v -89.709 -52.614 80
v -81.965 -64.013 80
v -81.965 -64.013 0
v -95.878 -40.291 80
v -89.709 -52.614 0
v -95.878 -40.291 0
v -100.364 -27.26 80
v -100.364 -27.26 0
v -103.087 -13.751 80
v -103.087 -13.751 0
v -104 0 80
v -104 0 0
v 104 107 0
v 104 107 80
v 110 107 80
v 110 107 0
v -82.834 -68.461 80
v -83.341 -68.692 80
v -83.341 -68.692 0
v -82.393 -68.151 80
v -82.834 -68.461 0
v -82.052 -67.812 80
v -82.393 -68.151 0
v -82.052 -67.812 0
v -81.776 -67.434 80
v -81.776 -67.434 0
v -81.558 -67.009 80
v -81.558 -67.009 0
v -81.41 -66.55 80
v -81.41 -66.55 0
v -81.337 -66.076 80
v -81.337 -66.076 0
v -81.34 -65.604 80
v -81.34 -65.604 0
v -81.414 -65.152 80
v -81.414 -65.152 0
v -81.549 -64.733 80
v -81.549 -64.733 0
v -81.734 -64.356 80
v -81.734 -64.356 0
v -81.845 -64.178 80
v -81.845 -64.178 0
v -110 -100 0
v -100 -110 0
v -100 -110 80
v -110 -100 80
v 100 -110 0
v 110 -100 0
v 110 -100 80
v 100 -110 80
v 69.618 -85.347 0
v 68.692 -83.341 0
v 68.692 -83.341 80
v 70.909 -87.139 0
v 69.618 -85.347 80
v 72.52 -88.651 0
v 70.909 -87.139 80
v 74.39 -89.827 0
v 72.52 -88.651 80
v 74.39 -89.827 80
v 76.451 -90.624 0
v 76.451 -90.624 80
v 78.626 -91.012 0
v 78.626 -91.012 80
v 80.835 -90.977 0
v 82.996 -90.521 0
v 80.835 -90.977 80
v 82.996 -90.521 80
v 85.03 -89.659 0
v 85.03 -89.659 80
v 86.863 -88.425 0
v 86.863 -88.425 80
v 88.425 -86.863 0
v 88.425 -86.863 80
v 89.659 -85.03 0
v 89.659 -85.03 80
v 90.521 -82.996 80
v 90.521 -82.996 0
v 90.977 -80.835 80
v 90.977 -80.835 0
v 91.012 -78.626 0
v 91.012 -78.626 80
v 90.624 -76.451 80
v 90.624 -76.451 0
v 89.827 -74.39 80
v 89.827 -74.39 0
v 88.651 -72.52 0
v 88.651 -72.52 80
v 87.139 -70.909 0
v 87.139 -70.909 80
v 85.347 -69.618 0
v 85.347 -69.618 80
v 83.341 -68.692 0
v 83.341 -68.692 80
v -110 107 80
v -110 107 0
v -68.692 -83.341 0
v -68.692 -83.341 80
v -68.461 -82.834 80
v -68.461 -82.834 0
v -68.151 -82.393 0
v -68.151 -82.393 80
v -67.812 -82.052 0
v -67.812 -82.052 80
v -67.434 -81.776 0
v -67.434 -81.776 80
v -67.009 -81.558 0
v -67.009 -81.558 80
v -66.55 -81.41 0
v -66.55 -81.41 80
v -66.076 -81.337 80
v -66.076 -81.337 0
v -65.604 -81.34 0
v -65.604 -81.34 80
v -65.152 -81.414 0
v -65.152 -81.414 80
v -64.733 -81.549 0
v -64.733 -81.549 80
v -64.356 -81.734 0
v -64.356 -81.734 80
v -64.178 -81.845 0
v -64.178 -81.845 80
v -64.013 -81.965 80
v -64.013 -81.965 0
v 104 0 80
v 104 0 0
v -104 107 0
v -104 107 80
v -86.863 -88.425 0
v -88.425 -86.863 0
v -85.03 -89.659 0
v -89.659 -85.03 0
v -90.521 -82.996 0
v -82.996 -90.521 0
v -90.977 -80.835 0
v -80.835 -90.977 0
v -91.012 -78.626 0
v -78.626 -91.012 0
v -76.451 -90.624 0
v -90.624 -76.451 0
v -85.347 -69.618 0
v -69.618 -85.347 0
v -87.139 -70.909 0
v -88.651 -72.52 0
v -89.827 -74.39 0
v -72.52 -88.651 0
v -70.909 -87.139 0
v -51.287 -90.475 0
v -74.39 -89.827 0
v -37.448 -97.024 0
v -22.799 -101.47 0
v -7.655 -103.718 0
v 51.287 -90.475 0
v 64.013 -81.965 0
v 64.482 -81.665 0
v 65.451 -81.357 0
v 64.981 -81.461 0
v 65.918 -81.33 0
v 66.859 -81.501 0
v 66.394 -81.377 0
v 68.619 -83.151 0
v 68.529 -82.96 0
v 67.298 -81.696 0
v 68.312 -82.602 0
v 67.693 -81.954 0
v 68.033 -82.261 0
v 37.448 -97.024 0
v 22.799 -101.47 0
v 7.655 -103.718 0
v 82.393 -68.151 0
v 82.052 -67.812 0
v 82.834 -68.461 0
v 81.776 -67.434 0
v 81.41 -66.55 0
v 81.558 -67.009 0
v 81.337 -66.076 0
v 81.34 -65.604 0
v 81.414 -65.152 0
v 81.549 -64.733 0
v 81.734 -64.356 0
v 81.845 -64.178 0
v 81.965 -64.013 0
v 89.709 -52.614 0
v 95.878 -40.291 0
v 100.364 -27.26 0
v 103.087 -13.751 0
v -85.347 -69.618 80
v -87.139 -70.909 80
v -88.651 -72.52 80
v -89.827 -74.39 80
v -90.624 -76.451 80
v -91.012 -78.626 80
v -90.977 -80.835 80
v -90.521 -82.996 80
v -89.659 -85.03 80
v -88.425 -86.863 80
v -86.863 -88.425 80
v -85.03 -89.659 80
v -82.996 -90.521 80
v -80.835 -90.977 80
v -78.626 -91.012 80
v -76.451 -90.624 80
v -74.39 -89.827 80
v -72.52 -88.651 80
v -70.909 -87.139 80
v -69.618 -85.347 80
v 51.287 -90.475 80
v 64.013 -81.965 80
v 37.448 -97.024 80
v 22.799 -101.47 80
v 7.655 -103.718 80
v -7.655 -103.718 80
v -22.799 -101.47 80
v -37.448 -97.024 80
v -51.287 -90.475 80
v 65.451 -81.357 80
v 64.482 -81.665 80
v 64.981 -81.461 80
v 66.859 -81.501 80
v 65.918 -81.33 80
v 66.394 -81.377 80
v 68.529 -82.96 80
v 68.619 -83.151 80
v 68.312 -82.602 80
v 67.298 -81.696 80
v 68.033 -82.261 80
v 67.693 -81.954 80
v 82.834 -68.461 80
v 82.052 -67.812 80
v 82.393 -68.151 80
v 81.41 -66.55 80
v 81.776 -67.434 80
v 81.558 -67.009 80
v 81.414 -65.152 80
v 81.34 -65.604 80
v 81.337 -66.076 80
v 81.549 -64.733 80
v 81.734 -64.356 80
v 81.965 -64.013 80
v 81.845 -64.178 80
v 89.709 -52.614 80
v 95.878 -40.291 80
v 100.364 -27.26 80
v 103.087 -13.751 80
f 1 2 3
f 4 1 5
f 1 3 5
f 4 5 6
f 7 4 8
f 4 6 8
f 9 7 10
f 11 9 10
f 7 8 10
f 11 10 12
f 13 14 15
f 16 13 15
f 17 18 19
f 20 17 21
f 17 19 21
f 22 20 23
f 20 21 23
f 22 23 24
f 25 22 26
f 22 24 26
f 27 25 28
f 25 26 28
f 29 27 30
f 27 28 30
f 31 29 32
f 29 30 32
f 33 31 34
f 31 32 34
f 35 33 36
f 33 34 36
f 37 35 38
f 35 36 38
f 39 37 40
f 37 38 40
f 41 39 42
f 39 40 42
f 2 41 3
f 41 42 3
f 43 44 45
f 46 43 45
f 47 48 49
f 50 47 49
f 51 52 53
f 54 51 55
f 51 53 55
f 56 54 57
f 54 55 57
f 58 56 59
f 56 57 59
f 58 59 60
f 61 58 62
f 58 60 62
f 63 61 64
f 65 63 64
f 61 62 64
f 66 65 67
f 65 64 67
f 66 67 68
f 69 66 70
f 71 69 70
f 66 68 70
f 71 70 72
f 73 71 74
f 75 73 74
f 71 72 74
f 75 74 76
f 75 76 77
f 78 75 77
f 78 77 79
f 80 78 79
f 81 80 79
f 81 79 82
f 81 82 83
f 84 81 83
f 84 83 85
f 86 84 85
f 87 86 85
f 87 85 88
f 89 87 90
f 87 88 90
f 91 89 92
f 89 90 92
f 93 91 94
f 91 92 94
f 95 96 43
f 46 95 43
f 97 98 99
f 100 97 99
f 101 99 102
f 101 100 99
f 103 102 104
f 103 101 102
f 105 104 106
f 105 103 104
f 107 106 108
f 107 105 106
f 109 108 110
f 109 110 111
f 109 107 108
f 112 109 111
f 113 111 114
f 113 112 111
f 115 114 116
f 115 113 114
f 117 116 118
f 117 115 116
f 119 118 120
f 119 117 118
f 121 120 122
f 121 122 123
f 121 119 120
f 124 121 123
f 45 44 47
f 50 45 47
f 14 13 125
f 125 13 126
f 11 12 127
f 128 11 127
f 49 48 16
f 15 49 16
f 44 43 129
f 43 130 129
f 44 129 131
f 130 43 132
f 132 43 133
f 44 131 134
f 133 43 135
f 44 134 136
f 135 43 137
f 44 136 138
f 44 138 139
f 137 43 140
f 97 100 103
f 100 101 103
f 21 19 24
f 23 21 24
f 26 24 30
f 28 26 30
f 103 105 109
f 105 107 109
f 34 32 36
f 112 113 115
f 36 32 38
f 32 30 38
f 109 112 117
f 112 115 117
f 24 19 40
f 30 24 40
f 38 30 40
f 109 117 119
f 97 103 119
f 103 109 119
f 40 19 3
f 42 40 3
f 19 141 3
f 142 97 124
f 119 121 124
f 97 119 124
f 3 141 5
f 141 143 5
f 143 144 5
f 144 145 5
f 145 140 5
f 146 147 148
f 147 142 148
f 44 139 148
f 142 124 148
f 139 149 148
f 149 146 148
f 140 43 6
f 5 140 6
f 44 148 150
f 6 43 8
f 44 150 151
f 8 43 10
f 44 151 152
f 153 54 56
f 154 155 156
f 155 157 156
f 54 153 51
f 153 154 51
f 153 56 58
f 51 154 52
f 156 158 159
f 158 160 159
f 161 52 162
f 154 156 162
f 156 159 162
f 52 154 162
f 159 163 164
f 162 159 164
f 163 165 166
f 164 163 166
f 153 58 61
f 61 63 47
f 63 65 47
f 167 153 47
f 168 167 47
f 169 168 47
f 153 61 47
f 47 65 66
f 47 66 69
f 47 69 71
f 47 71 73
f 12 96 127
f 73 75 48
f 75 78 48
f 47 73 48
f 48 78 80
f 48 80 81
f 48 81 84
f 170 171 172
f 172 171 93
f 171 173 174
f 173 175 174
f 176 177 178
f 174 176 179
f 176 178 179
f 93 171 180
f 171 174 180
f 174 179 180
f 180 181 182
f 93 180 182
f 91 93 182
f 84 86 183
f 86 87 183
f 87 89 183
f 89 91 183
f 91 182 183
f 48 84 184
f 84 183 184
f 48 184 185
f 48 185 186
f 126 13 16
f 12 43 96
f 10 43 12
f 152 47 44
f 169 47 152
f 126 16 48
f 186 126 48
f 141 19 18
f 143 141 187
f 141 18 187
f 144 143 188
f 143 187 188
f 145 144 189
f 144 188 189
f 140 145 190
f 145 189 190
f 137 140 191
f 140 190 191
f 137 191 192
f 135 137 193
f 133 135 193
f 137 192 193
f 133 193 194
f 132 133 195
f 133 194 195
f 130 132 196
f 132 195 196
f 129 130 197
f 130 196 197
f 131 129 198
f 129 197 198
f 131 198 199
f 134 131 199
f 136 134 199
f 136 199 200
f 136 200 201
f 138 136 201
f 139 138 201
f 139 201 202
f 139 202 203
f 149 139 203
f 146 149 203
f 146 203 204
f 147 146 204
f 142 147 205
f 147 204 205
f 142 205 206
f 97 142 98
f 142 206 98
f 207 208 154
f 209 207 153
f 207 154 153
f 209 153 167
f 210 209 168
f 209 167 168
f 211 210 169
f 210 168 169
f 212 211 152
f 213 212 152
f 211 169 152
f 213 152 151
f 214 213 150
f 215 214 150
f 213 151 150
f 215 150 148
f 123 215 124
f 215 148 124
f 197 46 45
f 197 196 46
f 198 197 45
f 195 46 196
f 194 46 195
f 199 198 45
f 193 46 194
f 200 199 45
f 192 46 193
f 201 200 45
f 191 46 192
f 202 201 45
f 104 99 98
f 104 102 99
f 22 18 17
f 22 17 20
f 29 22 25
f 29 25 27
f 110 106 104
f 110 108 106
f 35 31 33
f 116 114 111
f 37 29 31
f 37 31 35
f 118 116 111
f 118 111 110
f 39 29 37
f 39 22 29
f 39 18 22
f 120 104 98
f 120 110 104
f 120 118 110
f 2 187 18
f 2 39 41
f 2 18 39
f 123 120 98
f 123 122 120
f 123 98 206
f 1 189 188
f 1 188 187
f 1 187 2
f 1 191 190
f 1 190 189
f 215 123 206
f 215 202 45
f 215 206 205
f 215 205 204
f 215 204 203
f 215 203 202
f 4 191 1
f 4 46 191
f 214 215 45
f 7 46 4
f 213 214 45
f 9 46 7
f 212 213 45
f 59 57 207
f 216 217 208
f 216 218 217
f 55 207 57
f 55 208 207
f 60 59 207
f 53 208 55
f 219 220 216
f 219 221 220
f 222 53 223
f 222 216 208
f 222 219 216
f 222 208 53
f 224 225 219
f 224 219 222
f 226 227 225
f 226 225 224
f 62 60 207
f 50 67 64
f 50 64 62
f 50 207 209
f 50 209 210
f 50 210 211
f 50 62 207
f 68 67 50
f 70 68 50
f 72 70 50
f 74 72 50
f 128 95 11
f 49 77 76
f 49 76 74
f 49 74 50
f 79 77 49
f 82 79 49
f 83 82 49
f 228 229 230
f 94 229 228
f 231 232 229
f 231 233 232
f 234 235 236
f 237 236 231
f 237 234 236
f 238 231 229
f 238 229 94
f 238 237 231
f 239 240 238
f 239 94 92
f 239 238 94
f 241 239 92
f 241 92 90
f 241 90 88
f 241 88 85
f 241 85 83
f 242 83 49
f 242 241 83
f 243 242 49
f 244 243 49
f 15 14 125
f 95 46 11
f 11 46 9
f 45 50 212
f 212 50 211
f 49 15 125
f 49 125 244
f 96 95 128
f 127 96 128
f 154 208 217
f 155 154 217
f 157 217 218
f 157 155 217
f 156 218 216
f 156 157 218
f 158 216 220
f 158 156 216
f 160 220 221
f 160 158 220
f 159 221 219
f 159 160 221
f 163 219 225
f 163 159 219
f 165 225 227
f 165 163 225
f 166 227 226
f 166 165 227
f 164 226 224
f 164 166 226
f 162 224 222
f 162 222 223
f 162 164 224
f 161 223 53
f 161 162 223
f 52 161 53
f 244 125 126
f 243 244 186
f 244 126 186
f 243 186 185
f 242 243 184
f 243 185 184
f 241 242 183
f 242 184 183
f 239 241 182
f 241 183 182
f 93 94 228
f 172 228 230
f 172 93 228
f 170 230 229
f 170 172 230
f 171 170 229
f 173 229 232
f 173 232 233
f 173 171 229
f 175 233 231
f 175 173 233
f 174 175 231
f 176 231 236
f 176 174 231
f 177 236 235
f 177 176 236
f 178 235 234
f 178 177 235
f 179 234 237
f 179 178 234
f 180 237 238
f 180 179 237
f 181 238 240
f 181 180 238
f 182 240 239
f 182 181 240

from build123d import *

# Parameters (mm, degrees)
BOSS_EXTRUDE1_DEPTH = 80
SKETCH3_R           = 11.5
CUT_EXTRUDE1_DEPTH  = 175.928556845
FILLET1_R           = 3
CHAMFER1_SIZE       = 10
SKETCH4_W           = 220
SKETCH4_H           = 3
CUT_EXTRUDE2_DEPTH  = 175.928557017


with BuildPart() as part:
    # Sketch1 → Boss-Extrude1 (new body)
    with BuildSketch(Plane.XY):
        with BuildLine():
            Line((-104, 0), (-104, 110))
            Line((-104, 110), (-110, 110))
            Line((-110, 110), (-110, -110))
            Line((-110, -110), (110, -110))
            Line((110, -110), (110, 110))
            Line((110, 110), (104, 110))
            Line((104, 110), (104, 0))
            ThreePointArc((104, 0), (0, -104), (-104, 0))
        make_face()
    extrude(amount=BOSS_EXTRUDE1_DEPTH)

    # Sketch3 → Cut-Extrude1 (cut, through all)
    with BuildSketch(Plane.XY.offset(80)):
        with Locations((-79.549512883, -79.549512883)):
            Circle(SKETCH3_R)
        with Locations((79.549512883, -79.549512883)):
            Circle(SKETCH3_R)
    extrude(amount=-CUT_EXTRUDE1_DEPTH, mode=Mode.SUBTRACT)

    # Fillet1
    fillet1_edges = [part.edges().sort_by_distance(p)[0] for p in [
        (-78.613411263, -68.087675607, 40),
        (-68.087675607, -78.613411263, 40),
        (68.087675607, -78.613411263, 40),
        (78.613411263, -68.087675607, 40),
    ]]
    fillet(fillet1_edges, radius=FILLET1_R)

    # Chamfer1
    chamfer1_edges = [part.edges().sort_by_distance(p)[0] for p in [
        (110, -110, 40),
        (-110, -110, 40),
    ]]
    chamfer(chamfer1_edges, length=CHAMFER1_SIZE)

    # Sketch4 → Cut-Extrude2 (cut, through all)
    with BuildSketch(Plane.XY.offset(80)):
        with Locations((0, 108.5)):
            Rectangle(SKETCH4_W, SKETCH4_H)
    extrude(amount=-CUT_EXTRUDE2_DEPTH, mode=Mode.SUBTRACT)


solid = part.part
